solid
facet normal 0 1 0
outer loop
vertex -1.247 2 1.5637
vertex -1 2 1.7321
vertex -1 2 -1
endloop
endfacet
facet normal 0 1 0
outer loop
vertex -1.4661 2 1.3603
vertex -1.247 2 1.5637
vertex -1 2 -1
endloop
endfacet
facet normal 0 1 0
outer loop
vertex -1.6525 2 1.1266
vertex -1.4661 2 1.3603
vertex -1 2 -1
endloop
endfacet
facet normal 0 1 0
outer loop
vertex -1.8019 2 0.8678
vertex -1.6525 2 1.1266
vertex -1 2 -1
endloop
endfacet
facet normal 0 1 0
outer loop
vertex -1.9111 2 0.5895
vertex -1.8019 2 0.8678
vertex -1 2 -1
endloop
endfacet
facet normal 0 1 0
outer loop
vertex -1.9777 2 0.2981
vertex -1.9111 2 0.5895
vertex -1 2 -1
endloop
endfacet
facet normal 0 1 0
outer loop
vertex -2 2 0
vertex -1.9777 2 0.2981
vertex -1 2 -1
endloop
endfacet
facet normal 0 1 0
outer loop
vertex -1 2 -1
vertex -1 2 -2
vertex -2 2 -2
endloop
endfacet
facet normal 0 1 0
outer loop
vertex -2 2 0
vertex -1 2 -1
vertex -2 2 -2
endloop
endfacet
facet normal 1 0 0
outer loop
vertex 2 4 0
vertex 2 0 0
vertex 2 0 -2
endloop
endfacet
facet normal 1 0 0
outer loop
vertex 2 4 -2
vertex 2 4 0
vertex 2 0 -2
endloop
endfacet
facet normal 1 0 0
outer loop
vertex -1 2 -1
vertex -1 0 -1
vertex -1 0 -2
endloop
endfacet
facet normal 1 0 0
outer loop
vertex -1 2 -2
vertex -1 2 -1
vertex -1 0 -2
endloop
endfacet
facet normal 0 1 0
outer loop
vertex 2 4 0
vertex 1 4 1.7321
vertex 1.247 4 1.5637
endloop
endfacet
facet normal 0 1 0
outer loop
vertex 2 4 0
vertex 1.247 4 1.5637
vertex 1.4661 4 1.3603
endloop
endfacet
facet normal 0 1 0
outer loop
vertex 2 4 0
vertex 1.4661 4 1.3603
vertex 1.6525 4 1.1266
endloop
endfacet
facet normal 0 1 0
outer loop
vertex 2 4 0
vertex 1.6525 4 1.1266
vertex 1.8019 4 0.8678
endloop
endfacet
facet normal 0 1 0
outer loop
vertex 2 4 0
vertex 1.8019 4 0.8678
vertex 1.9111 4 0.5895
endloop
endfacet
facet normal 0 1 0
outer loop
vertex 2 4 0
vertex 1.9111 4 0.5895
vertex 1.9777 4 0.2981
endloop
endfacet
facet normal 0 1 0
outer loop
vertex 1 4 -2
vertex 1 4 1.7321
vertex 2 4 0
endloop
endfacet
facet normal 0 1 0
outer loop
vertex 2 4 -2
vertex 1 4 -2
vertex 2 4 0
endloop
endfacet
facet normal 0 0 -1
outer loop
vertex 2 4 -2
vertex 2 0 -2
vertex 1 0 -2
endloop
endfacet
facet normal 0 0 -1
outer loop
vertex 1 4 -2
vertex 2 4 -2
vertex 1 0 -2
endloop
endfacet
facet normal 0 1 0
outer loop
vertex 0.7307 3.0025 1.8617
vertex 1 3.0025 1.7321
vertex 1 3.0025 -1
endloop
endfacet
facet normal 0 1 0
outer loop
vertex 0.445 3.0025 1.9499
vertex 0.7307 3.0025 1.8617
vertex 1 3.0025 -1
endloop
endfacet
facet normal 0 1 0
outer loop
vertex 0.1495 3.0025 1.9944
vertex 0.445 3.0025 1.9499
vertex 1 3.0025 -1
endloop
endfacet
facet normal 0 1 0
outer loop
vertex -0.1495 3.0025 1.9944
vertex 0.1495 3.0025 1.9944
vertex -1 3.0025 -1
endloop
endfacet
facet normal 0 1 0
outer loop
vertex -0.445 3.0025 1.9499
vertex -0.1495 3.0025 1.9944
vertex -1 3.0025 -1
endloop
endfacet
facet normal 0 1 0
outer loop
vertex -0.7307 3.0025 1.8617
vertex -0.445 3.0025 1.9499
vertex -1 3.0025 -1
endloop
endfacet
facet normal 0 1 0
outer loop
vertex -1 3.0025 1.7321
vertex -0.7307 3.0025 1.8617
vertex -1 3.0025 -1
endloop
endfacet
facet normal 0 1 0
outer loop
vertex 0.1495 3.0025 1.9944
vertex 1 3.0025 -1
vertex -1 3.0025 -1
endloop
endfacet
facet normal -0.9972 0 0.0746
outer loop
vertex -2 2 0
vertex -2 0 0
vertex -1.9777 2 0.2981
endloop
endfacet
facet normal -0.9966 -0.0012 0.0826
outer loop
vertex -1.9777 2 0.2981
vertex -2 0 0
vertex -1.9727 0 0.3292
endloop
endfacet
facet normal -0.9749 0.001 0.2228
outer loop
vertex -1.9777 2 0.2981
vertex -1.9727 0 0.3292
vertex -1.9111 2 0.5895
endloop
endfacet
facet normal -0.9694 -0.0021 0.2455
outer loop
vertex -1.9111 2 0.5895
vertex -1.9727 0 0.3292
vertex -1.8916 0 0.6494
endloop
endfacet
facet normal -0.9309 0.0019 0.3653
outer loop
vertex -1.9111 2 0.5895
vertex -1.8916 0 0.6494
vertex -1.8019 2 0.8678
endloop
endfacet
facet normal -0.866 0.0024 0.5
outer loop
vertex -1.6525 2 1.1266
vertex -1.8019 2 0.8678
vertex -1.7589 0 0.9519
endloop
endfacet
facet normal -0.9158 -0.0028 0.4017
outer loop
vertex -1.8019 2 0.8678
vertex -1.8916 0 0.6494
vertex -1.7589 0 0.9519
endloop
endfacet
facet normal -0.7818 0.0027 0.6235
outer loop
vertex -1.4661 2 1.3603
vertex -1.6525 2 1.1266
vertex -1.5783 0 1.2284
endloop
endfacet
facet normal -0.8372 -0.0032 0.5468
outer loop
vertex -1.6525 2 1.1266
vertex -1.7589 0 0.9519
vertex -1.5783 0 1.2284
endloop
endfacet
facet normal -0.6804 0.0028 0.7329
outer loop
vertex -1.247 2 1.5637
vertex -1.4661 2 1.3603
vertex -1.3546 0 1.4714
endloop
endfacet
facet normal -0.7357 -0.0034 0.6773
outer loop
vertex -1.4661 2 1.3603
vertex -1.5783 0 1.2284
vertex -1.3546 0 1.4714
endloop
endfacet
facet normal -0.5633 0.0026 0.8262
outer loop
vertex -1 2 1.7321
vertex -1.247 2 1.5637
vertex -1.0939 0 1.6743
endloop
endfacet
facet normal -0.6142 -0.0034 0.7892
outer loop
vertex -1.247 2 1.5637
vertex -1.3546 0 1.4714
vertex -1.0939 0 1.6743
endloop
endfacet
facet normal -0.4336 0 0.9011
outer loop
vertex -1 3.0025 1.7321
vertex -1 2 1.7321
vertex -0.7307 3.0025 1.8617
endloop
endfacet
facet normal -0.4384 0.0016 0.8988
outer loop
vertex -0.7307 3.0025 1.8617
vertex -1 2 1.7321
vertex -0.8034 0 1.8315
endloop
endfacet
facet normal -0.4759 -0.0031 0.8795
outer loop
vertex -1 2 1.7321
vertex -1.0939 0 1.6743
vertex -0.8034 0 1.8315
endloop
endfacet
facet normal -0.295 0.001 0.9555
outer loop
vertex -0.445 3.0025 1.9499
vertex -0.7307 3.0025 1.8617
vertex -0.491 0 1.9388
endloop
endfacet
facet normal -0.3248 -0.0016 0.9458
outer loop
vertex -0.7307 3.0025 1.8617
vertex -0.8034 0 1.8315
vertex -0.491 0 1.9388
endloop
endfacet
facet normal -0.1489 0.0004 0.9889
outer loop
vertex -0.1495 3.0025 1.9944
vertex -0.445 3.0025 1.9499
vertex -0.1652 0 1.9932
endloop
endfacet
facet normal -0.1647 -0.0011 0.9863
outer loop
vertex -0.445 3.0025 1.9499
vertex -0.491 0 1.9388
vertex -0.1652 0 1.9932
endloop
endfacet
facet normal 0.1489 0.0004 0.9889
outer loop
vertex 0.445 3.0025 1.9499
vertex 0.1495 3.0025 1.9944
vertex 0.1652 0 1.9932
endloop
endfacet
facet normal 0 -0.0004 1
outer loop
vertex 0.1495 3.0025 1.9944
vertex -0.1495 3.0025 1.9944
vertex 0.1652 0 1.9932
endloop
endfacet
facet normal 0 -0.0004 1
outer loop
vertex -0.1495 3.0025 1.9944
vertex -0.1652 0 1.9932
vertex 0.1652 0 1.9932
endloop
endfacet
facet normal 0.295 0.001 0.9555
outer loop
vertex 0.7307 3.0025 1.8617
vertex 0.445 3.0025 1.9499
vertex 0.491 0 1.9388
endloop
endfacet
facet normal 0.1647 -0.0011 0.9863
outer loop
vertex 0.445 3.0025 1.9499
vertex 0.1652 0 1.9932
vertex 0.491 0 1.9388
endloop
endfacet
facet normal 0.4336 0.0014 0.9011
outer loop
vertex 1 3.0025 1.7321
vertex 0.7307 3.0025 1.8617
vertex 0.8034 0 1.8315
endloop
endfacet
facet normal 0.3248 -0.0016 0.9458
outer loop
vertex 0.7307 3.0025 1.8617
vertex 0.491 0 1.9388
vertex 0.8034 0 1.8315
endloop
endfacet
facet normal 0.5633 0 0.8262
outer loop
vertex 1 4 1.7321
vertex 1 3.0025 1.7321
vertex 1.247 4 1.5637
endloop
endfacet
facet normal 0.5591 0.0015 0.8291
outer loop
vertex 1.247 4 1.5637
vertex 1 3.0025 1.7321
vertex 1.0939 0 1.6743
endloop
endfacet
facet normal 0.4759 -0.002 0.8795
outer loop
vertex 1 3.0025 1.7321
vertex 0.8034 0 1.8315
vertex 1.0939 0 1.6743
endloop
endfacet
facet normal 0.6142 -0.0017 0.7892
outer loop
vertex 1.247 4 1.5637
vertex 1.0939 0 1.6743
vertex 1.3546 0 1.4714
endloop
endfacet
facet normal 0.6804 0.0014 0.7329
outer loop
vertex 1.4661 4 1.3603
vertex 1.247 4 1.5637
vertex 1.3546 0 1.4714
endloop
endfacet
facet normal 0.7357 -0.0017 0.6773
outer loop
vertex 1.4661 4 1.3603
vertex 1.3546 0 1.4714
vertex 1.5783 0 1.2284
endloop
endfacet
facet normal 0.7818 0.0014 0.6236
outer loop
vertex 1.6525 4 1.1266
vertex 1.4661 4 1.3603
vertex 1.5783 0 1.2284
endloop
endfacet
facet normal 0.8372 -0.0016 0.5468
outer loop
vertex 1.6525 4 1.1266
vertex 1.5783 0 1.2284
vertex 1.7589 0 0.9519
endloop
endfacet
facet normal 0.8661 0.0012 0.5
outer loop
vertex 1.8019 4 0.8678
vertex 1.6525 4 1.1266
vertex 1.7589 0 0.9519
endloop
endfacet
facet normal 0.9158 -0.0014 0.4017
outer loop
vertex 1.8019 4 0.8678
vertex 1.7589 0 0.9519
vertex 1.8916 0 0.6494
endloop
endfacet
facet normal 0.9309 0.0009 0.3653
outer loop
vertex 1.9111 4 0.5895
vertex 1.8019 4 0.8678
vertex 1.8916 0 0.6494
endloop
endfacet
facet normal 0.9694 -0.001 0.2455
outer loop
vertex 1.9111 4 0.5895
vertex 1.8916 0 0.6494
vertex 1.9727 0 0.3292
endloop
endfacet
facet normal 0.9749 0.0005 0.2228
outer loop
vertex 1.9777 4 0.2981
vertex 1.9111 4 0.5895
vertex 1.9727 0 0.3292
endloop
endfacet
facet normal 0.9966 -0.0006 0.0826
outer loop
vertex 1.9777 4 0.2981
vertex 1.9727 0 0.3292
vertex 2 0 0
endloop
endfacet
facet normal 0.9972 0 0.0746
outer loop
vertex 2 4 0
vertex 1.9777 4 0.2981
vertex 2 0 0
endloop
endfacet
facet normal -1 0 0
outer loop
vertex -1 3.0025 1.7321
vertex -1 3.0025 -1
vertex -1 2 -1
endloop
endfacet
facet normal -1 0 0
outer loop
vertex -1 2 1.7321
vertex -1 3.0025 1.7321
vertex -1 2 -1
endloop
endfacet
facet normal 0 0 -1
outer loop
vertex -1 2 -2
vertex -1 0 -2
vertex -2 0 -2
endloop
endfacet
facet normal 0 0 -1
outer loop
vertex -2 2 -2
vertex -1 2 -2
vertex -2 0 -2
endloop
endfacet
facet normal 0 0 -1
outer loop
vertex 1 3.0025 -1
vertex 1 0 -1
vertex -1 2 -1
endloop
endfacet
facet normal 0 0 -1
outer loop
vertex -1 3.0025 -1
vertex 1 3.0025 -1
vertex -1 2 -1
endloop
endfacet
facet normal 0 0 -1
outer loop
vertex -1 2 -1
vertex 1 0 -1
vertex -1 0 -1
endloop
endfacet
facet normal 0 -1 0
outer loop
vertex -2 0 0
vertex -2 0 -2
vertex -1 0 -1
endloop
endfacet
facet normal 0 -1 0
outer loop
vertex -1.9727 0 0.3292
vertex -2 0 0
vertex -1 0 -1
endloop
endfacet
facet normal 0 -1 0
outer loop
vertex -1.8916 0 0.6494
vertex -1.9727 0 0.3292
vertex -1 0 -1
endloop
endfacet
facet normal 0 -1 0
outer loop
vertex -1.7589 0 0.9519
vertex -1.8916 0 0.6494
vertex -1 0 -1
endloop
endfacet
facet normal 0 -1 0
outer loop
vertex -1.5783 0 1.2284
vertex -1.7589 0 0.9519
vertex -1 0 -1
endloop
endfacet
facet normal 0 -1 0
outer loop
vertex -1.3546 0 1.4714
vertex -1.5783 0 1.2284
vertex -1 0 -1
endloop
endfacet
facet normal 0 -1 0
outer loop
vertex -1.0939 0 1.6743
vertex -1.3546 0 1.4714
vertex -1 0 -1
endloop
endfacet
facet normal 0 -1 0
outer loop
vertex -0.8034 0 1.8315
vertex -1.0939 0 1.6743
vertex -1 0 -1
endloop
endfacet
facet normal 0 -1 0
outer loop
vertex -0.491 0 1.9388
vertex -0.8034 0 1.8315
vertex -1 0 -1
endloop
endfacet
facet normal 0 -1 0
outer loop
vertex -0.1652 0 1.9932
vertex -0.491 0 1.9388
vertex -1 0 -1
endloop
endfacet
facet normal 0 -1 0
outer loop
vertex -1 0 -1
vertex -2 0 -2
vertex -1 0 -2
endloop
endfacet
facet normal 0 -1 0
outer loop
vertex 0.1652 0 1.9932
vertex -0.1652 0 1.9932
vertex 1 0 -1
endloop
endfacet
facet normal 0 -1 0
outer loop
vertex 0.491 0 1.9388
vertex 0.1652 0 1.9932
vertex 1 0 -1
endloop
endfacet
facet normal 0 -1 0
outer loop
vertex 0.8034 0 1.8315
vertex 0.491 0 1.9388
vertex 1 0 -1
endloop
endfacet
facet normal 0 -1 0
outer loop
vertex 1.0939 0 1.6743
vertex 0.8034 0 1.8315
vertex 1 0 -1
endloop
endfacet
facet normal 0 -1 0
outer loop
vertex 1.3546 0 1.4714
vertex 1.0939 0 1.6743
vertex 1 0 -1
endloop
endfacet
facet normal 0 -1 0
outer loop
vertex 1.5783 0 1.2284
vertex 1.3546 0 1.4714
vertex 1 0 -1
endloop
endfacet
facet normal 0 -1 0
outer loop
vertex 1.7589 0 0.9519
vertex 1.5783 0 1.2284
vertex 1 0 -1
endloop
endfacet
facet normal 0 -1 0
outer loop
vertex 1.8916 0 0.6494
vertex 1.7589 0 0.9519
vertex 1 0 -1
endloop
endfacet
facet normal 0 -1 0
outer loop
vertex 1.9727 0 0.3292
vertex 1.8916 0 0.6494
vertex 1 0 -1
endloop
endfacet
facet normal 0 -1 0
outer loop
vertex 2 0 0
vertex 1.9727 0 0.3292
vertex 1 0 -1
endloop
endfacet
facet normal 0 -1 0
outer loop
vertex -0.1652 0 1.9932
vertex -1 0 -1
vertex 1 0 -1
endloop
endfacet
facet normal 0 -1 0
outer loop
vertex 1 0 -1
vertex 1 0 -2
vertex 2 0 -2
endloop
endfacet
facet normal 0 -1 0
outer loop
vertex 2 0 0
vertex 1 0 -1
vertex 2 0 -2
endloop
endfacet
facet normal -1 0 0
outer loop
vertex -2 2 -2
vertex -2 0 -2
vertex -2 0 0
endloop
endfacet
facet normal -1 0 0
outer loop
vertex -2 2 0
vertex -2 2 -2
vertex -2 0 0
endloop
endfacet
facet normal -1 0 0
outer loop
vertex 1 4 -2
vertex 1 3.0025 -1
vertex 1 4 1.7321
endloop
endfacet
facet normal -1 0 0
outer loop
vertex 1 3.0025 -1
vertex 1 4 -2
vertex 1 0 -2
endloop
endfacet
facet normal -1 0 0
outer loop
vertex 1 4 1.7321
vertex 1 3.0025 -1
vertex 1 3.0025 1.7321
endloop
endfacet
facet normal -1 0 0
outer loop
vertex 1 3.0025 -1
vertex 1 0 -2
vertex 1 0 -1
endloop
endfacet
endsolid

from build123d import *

# Parameters (mm, degrees)
BOSS_EXTRUDE1_DEPTH = 4
CUT_EXTRUDE1_DEPTH  = 4


with BuildPart() as part:
    # Sketch1 → Boss-Extrude1 (new body)
    with BuildSketch(Plane(origin=(0, 0, 0), x_dir=(1, 0, 0), z_dir=(0, 1, 0))):
        with BuildLine():
            Line((-2, 2), (-2, 0))
            ThreePointArc((-2, 0), (0, -2), (2, 0))
            Line((2, 0), (2, 2))
            Line((2, 2), (1, 2))
            Line((1, 2), (1, 1))
            Line((1, 1), (-1, 1))
            Line((-1, 1), (-1, 2))
            Line((-1, 2), (-2, 2))
        make_face()
    extrude(amount=BOSS_EXTRUDE1_DEPTH)

    # Sketch2 → Cut-Extrude1 (cut)
    with BuildSketch(Plane(origin=(0, 0, -2), x_dir=(-1, 0, 0), z_dir=(0, 0, -1))):
        Polygon((-1, 4), (-1, 3.002459536), (1, 3.002459536), (1, 2), (2, 2), (2, 4), align=None)
    extrude(amount=-CUT_EXTRUDE1_DEPTH, mode=Mode.SUBTRACT)


solid = part.part
